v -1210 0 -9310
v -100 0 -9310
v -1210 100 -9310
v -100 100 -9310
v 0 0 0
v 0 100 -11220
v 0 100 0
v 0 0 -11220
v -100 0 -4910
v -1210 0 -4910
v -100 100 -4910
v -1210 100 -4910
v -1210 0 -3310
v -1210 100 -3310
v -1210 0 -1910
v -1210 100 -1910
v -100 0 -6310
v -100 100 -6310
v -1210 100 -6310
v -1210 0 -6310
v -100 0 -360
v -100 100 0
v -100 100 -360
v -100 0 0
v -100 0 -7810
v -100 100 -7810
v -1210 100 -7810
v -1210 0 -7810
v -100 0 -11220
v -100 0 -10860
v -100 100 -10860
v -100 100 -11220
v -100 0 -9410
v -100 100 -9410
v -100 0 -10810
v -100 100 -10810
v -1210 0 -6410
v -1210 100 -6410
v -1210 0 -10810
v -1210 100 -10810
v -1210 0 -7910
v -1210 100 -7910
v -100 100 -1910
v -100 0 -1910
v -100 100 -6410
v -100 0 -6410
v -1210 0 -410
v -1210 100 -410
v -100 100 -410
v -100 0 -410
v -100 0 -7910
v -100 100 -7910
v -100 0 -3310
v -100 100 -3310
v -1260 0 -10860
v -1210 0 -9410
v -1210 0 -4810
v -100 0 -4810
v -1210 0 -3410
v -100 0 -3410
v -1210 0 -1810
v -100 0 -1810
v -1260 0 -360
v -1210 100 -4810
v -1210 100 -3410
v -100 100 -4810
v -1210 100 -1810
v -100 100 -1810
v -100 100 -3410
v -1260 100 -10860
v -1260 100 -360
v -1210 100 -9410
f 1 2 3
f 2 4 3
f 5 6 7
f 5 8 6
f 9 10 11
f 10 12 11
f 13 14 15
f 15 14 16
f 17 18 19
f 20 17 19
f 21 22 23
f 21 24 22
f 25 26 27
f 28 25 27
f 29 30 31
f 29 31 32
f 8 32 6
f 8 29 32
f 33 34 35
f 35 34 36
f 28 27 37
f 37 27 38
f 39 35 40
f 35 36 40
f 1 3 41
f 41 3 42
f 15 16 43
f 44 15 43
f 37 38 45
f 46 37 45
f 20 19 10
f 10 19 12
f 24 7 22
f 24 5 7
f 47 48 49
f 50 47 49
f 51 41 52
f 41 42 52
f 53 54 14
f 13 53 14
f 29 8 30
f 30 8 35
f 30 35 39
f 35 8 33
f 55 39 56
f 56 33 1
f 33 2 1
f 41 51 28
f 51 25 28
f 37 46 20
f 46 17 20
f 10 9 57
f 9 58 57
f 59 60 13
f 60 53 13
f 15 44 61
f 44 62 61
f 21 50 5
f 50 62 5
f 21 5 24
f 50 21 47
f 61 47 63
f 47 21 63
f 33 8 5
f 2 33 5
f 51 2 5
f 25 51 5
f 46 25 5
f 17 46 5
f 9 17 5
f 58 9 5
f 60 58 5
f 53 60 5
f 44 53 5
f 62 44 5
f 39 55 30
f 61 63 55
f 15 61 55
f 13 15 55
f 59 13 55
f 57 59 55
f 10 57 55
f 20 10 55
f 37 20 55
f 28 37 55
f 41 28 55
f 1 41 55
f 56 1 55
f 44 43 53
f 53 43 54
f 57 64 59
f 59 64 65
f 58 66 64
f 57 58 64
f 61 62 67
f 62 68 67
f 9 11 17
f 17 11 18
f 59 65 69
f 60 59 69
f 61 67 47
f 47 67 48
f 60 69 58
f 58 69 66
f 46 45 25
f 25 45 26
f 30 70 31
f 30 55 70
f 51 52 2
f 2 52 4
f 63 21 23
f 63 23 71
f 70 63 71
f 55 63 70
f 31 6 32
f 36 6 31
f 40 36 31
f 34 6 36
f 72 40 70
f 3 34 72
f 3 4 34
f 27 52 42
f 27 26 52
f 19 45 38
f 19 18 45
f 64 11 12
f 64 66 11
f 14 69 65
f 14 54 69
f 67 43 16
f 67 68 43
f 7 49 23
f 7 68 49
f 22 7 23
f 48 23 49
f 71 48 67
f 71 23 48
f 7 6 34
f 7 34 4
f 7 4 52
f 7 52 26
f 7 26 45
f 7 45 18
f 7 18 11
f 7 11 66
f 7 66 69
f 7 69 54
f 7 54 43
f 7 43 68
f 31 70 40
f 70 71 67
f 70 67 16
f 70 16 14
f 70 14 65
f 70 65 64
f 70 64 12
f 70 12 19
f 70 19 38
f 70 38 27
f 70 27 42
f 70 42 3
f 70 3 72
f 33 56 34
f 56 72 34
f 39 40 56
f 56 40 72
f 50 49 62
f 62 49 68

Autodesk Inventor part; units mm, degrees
ref_plane "YZ Plane" through (0, 0, 0) normal (1, 0, 0) x (0, 1, 0)
ref_plane "XZ Plane" through (0, 0, 0) normal (0, 1, 0) x (-1, 0, 0)
ref_plane "XY Plane" through (0, 0, 0) normal (0, 0, 1) x (1, 0, 0)
sketch "Sketch1" plane through (0, 0, 0) normal (0, 1, 0) x (-1, 0, 0)
  line L0 (0, 0) -> (100, 0)
  line L1 (100, 0) -> (100, -360)
  line L2 (100, -360) -> (1260, -360)
  line L3 (1260, -360) -> (1260, -10860)
  line L4 (1260, -10860) -> (100, -10860)
  line L5 (100, -10860) -> (100, -11220)
  line L6 (100, -11220) -> (0, -11220)
  line L7 (0, -11220) -> (0, 0)
  dimension "d0" = 11220
  dimension "d1" = 100
  dimension "d2" = 100
  dimension "d3" = 1260
  dimension "d4" = 10500
  dimension "d5" = 360
extrude "Extrusion1" add sketch "Sketch1" along normal blind 100
sketch "Sketch2" plane through (0, 100, 0) normal (0, 1, 0) x (1, 0, 0)
  line L0 (-1210, 410) -> (-100, 410)
  line L1 (-100, 410) -> (-100, 1810)
  line L2 (-100, 1810) -> (-1210, 1810)
  line L3 (-1210, 1810) -> (-1210, 410)
  point P0 (0, 0)
  dimension "d14" = 1400
  dimension "d15" = 1110
  dimension "d16" = 100
  dimension "d17" = 410
extrude "Extrusion2" cut sketch "Sketch2" against normal blind 100
sketch "Sketch3" plane through (0, 100, 0) normal (0, 1, 0) x (1, 0, 0)
  line L0 (-1210, 1910) -> (-100, 1910)
  line L1 (-100, 1910) -> (-100, 3310)
  line L2 (-100, 3310) -> (-1210, 3310)
  line L3 (-1210, 3310) -> (-1210, 1910)
  point P0 (0, 0)
  dimension "d20" = 1910
  dimension "d21" = 100
  dimension "d22" = 1400
  dimension "d23" = 1110
extrude "Extrusion3" cut sketch "Sketch3" against normal blind 100
sketch "Sketch4" plane through (0, 100, 0) normal (0, 1, 0) x (1, 0, 0)
  line L0 (-1210, 3410) -> (-100, 3410)
  line L1 (-100, 3410) -> (-100, 4810)
  line L2 (-100, 4810) -> (-1210, 4810)
  line L3 (-1210, 4810) -> (-1210, 3410)
  point P0 (0, 0)
  dimension "d26" = 3410
  dimension "d27" = 100
  dimension "d28" = 1400
  dimension "d29" = 1110
extrude "Extrusion5" cut sketch "Sketch4" against normal blind 100
sketch "Sketch5" plane through (0, 100, 0) normal (0, 1, 0) x (1, 0, 0)
  line L0 (-1210, 4910) -> (-100, 4910)
  line L1 (-100, 4910) -> (-100, 6310)
  line L2 (-100, 6310) -> (-1210, 6310)
  line L3 (-1210, 6310) -> (-1210, 4910)
  point P0 (0, 0)
  dimension "d37" = 4910
  dimension "d38" = 100
  dimension "d39" = 1400
  dimension "d40" = 1110
extrude "Extrusion6" cut sketch "Sketch5" against normal blind 100
sketch "Sketch6" plane through (0, 100, 0) normal (0, 1, 0) x (1, 0, 0)
  line L0 (-1210, 6410) -> (-100, 6410)
  line L1 (-100, 6410) -> (-100, 7810)
  line L2 (-100, 7810) -> (-1210, 7810)
  line L3 (-1210, 7810) -> (-1210, 6410)
  point P0 (0, 0)
  dimension "d43" = 1400
  dimension "d44" = 1110
  dimension "d45" = 6410
  dimension "d46" = 100
extrude "Extrusion7" cut sketch "Sketch6" against normal blind 100
sketch "Sketch7" plane through (0, 100, 0) normal (0, 1, 0) x (1, 0, 0)
  line L0 (-1210, 7910) -> (-100, 7910)
  line L1 (-100, 7910) -> (-100, 9310)
  line L2 (-100, 9310) -> (-1210, 9310)
  line L3 (-1210, 9310) -> (-1210, 7910)
  point P0 (0, 0)
  dimension "d49" = 1400
  dimension "d50" = 1110
  dimension "d51" = 7910
  dimension "d52" = 100
extrude "Extrusion8" cut sketch "Sketch7" against normal blind 100
sketch "Sketch8" plane through (0, 100, 0) normal (0, 1, 0) x (1, 0, 0)
  line L0 (-1210, 9410) -> (-100, 9410)
  line L1 (-100, 9410) -> (-100, 10810)
  line L2 (-100, 10810) -> (-1210, 10810)
  line L3 (-1210, 10810) -> (-1210, 9410)
  point P0 (0, 0)
  dimension "d55" = 1110
  dimension "d56" = 1400
  dimension "d57" = 9410
  dimension "d58" = 100
extrude "Extrusion9" cut sketch "Sketch8" against normal blind 100
properties part number "Gesims"
